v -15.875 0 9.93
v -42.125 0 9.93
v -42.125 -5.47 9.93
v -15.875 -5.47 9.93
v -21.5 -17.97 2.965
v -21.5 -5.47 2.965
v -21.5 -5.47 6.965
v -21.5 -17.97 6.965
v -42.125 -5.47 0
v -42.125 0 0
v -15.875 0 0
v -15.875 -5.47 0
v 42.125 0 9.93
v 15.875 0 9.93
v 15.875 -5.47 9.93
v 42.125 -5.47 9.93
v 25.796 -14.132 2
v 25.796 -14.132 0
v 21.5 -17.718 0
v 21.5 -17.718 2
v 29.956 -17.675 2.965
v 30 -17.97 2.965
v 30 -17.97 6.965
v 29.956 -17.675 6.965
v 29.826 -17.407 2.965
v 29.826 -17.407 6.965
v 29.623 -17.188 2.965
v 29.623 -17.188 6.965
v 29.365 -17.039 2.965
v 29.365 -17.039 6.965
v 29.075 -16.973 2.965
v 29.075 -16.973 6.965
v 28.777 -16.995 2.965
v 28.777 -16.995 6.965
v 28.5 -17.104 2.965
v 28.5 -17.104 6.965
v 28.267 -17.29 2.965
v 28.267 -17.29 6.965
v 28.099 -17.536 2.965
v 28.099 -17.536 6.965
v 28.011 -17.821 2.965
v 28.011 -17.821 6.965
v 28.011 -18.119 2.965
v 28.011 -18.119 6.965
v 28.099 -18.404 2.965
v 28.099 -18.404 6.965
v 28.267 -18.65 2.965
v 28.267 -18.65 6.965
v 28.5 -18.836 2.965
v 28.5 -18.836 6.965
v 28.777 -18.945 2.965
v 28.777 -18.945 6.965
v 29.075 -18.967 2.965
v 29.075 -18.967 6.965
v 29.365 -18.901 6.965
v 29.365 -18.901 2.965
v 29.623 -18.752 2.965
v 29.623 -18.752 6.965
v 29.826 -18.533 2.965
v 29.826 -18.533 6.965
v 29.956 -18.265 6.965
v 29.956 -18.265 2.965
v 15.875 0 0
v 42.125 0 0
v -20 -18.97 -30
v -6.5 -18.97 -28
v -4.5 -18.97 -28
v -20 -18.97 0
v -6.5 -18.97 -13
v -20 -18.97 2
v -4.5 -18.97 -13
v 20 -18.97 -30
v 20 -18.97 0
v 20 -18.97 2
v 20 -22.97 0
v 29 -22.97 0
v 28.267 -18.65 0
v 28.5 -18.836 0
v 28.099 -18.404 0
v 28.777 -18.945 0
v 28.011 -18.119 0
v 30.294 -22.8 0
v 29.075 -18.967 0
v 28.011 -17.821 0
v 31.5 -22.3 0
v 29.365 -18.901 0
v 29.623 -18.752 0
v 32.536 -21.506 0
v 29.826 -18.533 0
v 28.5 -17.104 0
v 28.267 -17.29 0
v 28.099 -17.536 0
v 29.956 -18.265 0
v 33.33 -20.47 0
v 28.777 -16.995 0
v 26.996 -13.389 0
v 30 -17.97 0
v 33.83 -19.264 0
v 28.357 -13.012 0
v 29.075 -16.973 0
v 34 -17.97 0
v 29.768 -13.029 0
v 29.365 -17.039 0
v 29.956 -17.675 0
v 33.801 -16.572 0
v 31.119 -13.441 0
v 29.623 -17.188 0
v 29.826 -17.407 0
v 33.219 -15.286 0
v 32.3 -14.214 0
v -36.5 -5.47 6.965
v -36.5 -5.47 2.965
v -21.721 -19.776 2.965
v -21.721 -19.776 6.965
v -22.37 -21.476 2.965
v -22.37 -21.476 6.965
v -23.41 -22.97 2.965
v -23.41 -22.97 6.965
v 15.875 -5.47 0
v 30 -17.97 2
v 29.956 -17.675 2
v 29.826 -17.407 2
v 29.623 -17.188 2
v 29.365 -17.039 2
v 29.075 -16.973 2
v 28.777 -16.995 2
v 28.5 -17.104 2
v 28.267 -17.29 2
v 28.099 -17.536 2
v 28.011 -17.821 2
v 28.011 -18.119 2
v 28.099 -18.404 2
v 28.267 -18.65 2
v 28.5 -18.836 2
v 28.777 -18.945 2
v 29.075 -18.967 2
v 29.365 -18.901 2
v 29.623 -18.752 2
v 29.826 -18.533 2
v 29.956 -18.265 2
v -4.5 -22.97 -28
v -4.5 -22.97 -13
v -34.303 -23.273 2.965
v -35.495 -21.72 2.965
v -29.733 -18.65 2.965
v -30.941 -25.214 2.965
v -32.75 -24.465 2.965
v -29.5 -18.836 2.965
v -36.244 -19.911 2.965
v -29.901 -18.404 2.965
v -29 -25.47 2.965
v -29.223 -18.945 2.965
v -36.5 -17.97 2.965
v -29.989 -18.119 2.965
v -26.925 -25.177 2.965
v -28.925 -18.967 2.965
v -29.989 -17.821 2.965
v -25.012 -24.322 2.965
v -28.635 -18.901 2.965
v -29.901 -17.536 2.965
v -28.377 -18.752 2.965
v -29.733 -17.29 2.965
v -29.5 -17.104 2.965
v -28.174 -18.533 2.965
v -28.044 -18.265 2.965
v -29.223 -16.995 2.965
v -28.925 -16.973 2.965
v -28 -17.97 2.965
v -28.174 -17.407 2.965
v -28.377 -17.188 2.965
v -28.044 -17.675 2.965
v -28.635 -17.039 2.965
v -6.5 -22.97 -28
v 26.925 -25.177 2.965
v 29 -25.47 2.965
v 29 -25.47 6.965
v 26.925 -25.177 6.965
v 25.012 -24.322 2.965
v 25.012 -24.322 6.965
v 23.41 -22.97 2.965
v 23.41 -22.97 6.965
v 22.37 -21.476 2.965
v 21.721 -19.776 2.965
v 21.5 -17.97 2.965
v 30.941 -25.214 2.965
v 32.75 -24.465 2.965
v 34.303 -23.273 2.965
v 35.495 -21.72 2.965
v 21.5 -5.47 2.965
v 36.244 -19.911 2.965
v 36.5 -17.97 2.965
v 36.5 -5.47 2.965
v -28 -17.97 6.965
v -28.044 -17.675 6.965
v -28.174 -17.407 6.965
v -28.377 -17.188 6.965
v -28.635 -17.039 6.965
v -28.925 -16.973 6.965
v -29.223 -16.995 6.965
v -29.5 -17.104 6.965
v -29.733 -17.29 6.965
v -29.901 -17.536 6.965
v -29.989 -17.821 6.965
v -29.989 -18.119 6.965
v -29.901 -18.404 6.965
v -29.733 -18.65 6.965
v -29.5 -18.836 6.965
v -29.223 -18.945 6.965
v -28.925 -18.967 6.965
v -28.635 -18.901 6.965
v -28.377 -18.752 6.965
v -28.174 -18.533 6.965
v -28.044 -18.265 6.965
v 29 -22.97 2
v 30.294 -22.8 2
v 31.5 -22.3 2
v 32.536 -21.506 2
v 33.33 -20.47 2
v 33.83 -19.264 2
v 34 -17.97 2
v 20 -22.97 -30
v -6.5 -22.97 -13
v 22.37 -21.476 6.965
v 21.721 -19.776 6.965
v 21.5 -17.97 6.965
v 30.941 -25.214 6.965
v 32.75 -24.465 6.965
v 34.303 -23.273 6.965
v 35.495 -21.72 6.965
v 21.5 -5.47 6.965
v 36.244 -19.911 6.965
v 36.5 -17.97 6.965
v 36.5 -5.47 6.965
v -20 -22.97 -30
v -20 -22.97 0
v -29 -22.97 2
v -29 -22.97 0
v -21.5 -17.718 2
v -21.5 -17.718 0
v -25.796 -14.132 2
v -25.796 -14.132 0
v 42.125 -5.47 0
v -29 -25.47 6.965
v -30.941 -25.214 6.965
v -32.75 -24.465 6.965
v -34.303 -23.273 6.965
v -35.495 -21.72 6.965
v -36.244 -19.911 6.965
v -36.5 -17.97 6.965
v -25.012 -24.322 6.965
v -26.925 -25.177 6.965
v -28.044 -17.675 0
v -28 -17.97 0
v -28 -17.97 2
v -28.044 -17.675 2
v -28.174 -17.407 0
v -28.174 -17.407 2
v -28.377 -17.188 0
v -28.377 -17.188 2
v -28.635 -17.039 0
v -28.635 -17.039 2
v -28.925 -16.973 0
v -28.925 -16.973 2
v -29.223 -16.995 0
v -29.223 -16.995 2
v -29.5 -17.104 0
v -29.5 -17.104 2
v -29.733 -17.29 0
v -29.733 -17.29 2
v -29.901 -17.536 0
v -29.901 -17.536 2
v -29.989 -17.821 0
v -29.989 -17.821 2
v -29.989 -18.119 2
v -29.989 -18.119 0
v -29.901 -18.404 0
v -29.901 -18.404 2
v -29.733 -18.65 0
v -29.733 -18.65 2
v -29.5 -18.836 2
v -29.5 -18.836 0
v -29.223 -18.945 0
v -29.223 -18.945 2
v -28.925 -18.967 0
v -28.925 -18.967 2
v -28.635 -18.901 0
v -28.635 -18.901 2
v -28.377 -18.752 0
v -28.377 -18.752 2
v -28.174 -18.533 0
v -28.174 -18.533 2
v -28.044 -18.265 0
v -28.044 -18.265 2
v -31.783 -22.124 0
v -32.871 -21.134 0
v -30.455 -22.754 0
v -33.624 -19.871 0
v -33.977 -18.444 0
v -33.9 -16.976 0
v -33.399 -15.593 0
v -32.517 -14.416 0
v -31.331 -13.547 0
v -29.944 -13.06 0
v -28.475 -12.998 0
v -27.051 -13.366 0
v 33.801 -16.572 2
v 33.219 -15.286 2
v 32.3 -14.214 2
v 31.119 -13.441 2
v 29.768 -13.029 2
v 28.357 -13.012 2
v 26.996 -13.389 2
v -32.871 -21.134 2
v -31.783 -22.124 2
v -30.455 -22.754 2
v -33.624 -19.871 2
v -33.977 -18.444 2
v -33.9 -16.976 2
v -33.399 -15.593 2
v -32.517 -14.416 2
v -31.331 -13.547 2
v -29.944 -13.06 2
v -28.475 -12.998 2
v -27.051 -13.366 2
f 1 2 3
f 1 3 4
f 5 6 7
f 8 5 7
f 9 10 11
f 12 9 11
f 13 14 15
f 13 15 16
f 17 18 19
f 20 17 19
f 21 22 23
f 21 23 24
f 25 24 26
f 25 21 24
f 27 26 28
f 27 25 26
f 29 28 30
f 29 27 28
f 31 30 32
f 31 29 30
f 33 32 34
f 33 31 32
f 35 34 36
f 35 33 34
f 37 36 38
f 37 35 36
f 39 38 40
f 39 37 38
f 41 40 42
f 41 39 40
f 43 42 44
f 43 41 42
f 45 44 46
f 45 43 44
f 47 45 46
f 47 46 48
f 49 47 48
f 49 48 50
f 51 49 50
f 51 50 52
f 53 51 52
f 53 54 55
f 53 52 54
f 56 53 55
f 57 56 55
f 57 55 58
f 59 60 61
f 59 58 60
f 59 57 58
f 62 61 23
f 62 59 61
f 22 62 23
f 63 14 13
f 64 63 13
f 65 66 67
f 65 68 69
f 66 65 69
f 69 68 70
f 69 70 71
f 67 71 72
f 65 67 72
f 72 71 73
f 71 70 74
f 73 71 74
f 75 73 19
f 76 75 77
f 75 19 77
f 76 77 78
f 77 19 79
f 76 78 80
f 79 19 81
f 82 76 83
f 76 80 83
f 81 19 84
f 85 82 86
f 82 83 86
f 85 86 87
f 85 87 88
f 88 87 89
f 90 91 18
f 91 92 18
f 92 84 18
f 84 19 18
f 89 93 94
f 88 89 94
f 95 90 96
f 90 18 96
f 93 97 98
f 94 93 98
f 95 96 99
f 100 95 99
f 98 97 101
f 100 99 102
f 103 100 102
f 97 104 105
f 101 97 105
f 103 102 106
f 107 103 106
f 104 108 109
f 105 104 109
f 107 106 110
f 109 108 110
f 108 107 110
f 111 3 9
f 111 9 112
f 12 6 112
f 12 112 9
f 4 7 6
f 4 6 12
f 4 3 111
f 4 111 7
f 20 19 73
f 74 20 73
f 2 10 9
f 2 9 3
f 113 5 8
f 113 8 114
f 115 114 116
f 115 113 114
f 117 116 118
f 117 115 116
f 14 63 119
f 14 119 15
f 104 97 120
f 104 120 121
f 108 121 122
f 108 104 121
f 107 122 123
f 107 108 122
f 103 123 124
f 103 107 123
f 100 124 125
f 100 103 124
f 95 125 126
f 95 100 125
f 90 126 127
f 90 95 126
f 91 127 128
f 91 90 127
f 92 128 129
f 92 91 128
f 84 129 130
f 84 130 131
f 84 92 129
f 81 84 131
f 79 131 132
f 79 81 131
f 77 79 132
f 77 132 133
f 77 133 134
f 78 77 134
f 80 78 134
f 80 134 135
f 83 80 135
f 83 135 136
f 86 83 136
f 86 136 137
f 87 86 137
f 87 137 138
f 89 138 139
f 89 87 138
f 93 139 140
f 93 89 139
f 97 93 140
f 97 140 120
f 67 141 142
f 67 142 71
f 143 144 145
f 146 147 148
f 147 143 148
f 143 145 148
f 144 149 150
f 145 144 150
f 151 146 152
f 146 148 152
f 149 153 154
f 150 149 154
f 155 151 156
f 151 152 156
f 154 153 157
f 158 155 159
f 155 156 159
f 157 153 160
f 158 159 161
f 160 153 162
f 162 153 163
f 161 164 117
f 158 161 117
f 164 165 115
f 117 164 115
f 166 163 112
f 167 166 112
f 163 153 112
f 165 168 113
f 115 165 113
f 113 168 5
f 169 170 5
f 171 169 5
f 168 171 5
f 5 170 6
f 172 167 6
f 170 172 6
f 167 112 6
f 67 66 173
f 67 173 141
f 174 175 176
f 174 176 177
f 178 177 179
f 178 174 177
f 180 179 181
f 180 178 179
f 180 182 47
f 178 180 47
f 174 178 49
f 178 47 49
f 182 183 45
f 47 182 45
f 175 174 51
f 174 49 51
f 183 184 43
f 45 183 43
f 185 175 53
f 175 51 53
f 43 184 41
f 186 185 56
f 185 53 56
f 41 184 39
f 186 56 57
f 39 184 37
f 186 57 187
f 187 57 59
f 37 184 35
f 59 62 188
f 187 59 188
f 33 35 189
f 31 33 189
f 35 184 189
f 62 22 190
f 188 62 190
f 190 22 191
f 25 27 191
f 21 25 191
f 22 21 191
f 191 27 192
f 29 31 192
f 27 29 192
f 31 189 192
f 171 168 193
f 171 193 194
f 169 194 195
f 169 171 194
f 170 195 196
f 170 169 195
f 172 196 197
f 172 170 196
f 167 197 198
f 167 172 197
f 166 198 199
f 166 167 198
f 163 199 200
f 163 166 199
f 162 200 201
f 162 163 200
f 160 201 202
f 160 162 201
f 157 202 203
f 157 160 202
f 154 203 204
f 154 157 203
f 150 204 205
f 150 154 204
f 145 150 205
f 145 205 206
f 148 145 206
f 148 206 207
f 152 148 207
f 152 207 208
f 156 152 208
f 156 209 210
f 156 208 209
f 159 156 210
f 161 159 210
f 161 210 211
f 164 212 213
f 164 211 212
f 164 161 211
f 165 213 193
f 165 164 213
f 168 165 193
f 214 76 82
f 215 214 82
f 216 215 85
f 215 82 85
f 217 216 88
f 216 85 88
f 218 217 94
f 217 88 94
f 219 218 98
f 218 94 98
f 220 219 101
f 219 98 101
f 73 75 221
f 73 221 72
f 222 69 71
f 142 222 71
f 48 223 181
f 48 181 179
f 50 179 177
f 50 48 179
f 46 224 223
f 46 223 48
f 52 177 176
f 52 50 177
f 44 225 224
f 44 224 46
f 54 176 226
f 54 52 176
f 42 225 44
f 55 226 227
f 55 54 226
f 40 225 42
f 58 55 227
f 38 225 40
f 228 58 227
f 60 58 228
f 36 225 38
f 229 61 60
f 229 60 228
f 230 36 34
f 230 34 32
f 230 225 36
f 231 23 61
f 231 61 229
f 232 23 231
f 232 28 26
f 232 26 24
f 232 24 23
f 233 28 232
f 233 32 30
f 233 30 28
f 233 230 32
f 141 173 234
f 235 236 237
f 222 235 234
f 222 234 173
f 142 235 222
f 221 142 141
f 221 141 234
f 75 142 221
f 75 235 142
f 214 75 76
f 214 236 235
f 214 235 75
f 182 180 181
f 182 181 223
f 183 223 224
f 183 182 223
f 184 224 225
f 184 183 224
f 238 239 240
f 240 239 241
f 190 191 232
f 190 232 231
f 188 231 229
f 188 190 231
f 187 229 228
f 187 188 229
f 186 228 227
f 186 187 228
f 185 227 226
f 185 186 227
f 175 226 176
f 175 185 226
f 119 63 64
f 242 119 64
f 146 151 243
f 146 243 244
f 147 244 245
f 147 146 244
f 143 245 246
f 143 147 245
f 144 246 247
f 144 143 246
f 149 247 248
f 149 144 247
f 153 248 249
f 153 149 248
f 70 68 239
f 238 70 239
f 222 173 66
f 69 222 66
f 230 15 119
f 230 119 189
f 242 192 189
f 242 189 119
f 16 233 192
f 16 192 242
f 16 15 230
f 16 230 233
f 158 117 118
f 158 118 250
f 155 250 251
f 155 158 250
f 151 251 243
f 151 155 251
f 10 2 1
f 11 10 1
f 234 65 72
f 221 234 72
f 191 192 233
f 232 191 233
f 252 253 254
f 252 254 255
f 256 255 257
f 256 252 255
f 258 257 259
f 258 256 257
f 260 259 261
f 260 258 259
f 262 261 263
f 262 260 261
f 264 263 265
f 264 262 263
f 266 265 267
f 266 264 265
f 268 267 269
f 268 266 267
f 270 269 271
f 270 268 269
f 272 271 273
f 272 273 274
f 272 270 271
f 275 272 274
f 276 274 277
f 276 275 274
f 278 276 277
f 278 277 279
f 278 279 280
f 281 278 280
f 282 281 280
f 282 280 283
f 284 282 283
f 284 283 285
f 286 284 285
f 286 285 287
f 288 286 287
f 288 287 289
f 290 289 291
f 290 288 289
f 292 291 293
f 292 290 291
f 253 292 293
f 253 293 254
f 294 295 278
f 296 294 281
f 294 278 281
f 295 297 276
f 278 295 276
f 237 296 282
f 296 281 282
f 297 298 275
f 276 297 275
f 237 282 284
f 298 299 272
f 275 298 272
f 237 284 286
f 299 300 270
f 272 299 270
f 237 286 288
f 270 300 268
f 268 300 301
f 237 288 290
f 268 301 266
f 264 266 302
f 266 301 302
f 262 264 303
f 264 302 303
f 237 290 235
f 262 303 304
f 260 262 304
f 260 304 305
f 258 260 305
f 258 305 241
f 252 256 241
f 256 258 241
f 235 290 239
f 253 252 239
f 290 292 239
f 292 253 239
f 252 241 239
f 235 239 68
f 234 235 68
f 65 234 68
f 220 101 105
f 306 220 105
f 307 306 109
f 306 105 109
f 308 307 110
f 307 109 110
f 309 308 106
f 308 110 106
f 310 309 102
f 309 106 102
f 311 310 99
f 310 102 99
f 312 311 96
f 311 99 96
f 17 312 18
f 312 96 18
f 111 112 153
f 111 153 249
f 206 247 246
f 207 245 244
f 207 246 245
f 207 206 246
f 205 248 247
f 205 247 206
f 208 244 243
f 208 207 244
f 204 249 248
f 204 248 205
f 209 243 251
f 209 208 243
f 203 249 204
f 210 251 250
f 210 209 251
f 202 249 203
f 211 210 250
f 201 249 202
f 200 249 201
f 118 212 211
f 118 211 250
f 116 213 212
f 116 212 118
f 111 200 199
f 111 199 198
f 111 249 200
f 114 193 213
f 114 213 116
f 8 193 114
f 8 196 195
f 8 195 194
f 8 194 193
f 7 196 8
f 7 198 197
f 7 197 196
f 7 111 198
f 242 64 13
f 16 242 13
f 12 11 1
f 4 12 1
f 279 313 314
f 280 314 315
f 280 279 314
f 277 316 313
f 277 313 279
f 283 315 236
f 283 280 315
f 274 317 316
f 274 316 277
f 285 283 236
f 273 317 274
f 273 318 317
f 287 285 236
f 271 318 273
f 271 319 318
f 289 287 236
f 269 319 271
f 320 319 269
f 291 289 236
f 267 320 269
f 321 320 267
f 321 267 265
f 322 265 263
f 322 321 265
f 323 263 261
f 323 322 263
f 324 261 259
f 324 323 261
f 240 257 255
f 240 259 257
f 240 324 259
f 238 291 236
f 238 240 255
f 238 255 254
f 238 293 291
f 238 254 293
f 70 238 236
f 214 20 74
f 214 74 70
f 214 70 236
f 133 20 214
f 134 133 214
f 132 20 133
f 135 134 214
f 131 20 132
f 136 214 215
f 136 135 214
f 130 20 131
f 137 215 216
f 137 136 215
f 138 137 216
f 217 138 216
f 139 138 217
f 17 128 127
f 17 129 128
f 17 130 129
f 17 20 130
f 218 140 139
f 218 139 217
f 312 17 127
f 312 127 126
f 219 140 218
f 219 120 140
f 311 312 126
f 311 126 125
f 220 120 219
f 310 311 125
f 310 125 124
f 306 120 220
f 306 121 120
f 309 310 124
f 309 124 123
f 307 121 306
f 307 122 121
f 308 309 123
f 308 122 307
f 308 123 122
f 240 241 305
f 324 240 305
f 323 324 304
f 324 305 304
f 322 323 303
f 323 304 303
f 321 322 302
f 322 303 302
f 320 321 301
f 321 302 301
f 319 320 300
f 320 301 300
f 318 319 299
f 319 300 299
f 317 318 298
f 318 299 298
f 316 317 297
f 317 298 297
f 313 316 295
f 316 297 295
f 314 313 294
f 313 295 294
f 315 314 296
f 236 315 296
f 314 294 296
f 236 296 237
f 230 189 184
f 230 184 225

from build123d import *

# Parameters (mm, degrees)
F1_W          = 26.25
F1_H          = 9.93
F1_W_2        = 15
F1_H_2        = 4
F2_DEPTH      = 5.47
F3_DEPTH      = 25.47
F4_R          = 1
F5_DEPTH      = 25
F6_DEPTH      = 2
F4_W          = 13.5
F4_H          = 4
F7_DEPTH      = 30
F7_DEPTH_BACK = 2
F4_W_2        = 24.5
F4_W_3        = 2
F8_DEPTH      = 2
F8_DEPTH_BACK = 13
F9_START      = -28
F9_DEPTH      = 2


with BuildPart() as f2:
    # F1 (on Front) → F2 (new body)
    with BuildSketch(Plane.XZ):
        with Locations((-29, 4.965)):
            Rectangle(F1_W, F1_H)
        with Locations((-29, 4.965)):
            Rectangle(F1_W_2, F1_H_2, mode=Mode.SUBTRACT)
    extrude(amount=F2_DEPTH)

    # F1 (on Front) → F3 (join)
    with BuildSketch(Plane.XZ):
        with Locations((-29, 4.965)):
            Rectangle(F1_W_2, F1_H_2)
    extrude(amount=F3_DEPTH)


with BuildPart() as f2b:
    # F1 (on Front) → F2, piece 2 (new body)
    with BuildSketch(Plane.XZ):
        with Locations((29, 4.965)):
            Rectangle(F1_W, F1_H)
        with Locations((29, 4.965)):
            Rectangle(F1_W_2, F1_H_2, mode=Mode.SUBTRACT)
    extrude(amount=F2_DEPTH)

    # F1 (on Front) → F3, piece 2 (join)
    with BuildSketch(Plane.XZ):
        with Locations((29, 4.965)):
            Rectangle(F1_W_2, F1_H_2)
    extrude(amount=F3_DEPTH)


with BuildPart() as f5_tool:
    # F4 (on Top) → F5 (new body)
    with BuildSketch(Plane.XY):
        with BuildLine():
            Line((-36.5, -17.97), (-36.5, -25.47))
            Line((-36.5, -25.47), (-29, -25.47))
            ThreePointArc((-29, -25.47), (-34.3033008589, -23.2733008589), (-36.5, -17.97))
        make_face()
        with BuildLine():
            ThreePointArc((-23.4098300563, -22.97), (-25.9381378215, -24.8165319688), (-29, -25.47))
            Line((-29, -25.47), (-21.5, -25.47))
            Line((-21.5, -25.47), (-21.5, -22.97))
            Line((-21.5, -22.97), (-23.4098300563, -22.97))
        make_face()
        with BuildLine():
            Line((23.4098300563, -22.97), (21.5, -22.97))
            Line((21.5, -22.97), (21.5, -25.47))
            Line((21.5, -25.47), (29, -25.47))
            ThreePointArc((29, -25.47), (25.9381378215, -24.8165319688), (23.4098300563, -22.97))
        make_face()
        with BuildLine():
            ThreePointArc((36.5, -17.97), (34.3033008589, -23.2733008589), (29, -25.47))
            Line((29, -25.47), (36.5, -25.47))
            Line((36.5, -25.47), (36.5, -17.97))
        make_face()
        with BuildLine():
            ThreePointArc((-21.5, -17.97), (-21.9937073078, -20.6461656733), (-23.4098300563, -22.97))
            Line((-23.4098300563, -22.97), (-21.5, -22.97))
            Line((-21.5, -22.97), (-21.5, -17.97))
        make_face()
        with BuildLine():
            Line((21.5, -17.97), (21.5, -22.97))
            Line((21.5, -22.97), (23.4098300563, -22.97))
            ThreePointArc((23.4098300563, -22.97), (21.9937073078, -20.6461656733), (21.5, -17.97))
        make_face()
        with Locations((-29, -17.97)):
            Circle(F4_R)
        with Locations((29, -17.97)):
            Circle(F4_R)
    extrude(amount=F5_DEPTH)


with BuildPart() as f2_1:
    add(f2.part)

    # F5: cut by f5_tool
    add(f5_tool.part, mode=Mode.SUBTRACT)


with BuildPart() as f2b_1:
    add(f2b.part)

    # F5: cut by f5_tool
    add(f5_tool.part, mode=Mode.SUBTRACT)


with BuildPart() as f6:
    # F4 (on Top) → F6 (new body)
    with BuildSketch(Plane.XY):
        Polygon((-21.5, -17.97), (-21.5, -22.97), (-20, -22.97), (-20, -18.97), (-21.5, -17.717790031), align=None)
        with BuildLine():
            ThreePointArc((-25.7957418027, -14.1316762245), (-33.7006179848, -16.2658314164), (-29, -22.97))
            ThreePointArc((-29, -22.97), (-25.4644660941, -21.5055339059), (-24, -17.97))
            ThreePointArc((-24, -17.97), (-24.4711319855, -15.851190309), (-25.7957418027, -14.1316762245))
        make_face()
        with Locations((-29, -17.97)):
            Circle(F4_R, mode=Mode.SUBTRACT)
        with BuildLine():
            Line((-29, -22.97), (-23.4098300563, -22.97))
            ThreePointArc((-23.4098300563, -22.97), (-21.9937073078, -20.6461656733), (-21.5, -17.97))
            Line((-21.5, -17.97), (-21.5, -17.717790031))
            Line((-21.5, -17.717790031), (-25.7957418027, -14.1316762245))
            ThreePointArc((-25.7957418027, -14.1316762245), (-24.4711319855, -15.851190309), (-24, -17.97))
            ThreePointArc((-24, -17.97), (-25.4644660941, -21.5055339059), (-29, -22.97))
        make_face()
        with BuildLine():
            ThreePointArc((-21.5, -17.97), (-21.9937073078, -20.6461656733), (-23.4098300563, -22.97))
            Line((-23.4098300563, -22.97), (-21.5, -22.97))
            Line((-21.5, -22.97), (-21.5, -17.97))
        make_face()
    extrude(amount=F6_DEPTH)

    # F4 (on Top) → F7 (join, two sides)
    with BuildSketch(Plane.XY) as f7_sk:
        with Locations((-13.25, -20.97)):
            Rectangle(F4_W, F4_H)
    extrude(amount=-F7_DEPTH)
    extrude(f7_sk.sketch, amount=F7_DEPTH_BACK)



with BuildPart() as f6b:
    # F4 (on Top) → F6, piece 2 (new body)
    with BuildSketch(Plane.XY):
        with BuildLine():
            ThreePointArc((25.7957418027, -14.1316762245), (24.2993820152, -19.6741685836), (29, -22.97))
            ThreePointArc((29, -22.97), (32.5355339059, -21.5055339059), (34, -17.97))
            ThreePointArc((34, -17.97), (31.118809691, -13.4411319855), (25.7957418027, -14.1316762245))
        make_face()
        with Locations((29, -17.97)):
            Circle(F4_R, mode=Mode.SUBTRACT)
        with BuildLine():
            Line((21.5, -17.717790031), (21.5, -17.97))
            ThreePointArc((21.5, -17.97), (21.9937073078, -20.6461656733), (23.4098300563, -22.97))
            Line((23.4098300563, -22.97), (29, -22.97))
            ThreePointArc((29, -22.97), (24.2993820152, -19.6741685836), (25.7957418027, -14.1316762245))
            Line((25.7957418027, -14.1316762245), (21.5, -17.717790031))
        make_face()
        with BuildLine():
            Line((21.5, -17.97), (21.5, -22.97))
            Line((21.5, -22.97), (23.4098300563, -22.97))
            ThreePointArc((23.4098300563, -22.97), (21.9937073078, -20.6461656733), (21.5, -17.97))
        make_face()
        Polygon((20, -18.97), (20, -22.97), (21.5, -22.97), (21.5, -17.97), (21.5, -17.717790031), align=None)
    extrude(amount=F6_DEPTH)

    # F4 (on Top) → F7, piece 2 (join, two sides)
    with BuildSketch(Plane.XY) as f7_2_sk:
        with Locations((7.75, -20.97)):
            Rectangle(F4_W_2, F4_H)
    extrude(amount=-F7_DEPTH)
    extrude(f7_2_sk.sketch, amount=F7_DEPTH_BACK)


with BuildPart() as f6_1:
    add(f6.part)

    add(f6b.part)  # F8 merges F6b
    # F4 (on Top) → F8 (join, two sides)
    with BuildSketch(Plane.XY) as f8_sk:
        with Locations((-5.5, -20.97)):
            Rectangle(F4_W_3, F4_H)
    extrude(amount=F8_DEPTH)
    extrude(f8_sk.sketch, amount=-F8_DEPTH_BACK)

    # F4 (on Top) → F9 (join)
    with BuildSketch(Plane.XY.offset(F9_START)):
        with Locations((-5.5, -20.97)):
            Rectangle(F4_W_3, F4_H)
    extrude(amount=-F9_DEPTH)


solid = Compound([f2_1.part, f2b_1.part, f6_1.part])
